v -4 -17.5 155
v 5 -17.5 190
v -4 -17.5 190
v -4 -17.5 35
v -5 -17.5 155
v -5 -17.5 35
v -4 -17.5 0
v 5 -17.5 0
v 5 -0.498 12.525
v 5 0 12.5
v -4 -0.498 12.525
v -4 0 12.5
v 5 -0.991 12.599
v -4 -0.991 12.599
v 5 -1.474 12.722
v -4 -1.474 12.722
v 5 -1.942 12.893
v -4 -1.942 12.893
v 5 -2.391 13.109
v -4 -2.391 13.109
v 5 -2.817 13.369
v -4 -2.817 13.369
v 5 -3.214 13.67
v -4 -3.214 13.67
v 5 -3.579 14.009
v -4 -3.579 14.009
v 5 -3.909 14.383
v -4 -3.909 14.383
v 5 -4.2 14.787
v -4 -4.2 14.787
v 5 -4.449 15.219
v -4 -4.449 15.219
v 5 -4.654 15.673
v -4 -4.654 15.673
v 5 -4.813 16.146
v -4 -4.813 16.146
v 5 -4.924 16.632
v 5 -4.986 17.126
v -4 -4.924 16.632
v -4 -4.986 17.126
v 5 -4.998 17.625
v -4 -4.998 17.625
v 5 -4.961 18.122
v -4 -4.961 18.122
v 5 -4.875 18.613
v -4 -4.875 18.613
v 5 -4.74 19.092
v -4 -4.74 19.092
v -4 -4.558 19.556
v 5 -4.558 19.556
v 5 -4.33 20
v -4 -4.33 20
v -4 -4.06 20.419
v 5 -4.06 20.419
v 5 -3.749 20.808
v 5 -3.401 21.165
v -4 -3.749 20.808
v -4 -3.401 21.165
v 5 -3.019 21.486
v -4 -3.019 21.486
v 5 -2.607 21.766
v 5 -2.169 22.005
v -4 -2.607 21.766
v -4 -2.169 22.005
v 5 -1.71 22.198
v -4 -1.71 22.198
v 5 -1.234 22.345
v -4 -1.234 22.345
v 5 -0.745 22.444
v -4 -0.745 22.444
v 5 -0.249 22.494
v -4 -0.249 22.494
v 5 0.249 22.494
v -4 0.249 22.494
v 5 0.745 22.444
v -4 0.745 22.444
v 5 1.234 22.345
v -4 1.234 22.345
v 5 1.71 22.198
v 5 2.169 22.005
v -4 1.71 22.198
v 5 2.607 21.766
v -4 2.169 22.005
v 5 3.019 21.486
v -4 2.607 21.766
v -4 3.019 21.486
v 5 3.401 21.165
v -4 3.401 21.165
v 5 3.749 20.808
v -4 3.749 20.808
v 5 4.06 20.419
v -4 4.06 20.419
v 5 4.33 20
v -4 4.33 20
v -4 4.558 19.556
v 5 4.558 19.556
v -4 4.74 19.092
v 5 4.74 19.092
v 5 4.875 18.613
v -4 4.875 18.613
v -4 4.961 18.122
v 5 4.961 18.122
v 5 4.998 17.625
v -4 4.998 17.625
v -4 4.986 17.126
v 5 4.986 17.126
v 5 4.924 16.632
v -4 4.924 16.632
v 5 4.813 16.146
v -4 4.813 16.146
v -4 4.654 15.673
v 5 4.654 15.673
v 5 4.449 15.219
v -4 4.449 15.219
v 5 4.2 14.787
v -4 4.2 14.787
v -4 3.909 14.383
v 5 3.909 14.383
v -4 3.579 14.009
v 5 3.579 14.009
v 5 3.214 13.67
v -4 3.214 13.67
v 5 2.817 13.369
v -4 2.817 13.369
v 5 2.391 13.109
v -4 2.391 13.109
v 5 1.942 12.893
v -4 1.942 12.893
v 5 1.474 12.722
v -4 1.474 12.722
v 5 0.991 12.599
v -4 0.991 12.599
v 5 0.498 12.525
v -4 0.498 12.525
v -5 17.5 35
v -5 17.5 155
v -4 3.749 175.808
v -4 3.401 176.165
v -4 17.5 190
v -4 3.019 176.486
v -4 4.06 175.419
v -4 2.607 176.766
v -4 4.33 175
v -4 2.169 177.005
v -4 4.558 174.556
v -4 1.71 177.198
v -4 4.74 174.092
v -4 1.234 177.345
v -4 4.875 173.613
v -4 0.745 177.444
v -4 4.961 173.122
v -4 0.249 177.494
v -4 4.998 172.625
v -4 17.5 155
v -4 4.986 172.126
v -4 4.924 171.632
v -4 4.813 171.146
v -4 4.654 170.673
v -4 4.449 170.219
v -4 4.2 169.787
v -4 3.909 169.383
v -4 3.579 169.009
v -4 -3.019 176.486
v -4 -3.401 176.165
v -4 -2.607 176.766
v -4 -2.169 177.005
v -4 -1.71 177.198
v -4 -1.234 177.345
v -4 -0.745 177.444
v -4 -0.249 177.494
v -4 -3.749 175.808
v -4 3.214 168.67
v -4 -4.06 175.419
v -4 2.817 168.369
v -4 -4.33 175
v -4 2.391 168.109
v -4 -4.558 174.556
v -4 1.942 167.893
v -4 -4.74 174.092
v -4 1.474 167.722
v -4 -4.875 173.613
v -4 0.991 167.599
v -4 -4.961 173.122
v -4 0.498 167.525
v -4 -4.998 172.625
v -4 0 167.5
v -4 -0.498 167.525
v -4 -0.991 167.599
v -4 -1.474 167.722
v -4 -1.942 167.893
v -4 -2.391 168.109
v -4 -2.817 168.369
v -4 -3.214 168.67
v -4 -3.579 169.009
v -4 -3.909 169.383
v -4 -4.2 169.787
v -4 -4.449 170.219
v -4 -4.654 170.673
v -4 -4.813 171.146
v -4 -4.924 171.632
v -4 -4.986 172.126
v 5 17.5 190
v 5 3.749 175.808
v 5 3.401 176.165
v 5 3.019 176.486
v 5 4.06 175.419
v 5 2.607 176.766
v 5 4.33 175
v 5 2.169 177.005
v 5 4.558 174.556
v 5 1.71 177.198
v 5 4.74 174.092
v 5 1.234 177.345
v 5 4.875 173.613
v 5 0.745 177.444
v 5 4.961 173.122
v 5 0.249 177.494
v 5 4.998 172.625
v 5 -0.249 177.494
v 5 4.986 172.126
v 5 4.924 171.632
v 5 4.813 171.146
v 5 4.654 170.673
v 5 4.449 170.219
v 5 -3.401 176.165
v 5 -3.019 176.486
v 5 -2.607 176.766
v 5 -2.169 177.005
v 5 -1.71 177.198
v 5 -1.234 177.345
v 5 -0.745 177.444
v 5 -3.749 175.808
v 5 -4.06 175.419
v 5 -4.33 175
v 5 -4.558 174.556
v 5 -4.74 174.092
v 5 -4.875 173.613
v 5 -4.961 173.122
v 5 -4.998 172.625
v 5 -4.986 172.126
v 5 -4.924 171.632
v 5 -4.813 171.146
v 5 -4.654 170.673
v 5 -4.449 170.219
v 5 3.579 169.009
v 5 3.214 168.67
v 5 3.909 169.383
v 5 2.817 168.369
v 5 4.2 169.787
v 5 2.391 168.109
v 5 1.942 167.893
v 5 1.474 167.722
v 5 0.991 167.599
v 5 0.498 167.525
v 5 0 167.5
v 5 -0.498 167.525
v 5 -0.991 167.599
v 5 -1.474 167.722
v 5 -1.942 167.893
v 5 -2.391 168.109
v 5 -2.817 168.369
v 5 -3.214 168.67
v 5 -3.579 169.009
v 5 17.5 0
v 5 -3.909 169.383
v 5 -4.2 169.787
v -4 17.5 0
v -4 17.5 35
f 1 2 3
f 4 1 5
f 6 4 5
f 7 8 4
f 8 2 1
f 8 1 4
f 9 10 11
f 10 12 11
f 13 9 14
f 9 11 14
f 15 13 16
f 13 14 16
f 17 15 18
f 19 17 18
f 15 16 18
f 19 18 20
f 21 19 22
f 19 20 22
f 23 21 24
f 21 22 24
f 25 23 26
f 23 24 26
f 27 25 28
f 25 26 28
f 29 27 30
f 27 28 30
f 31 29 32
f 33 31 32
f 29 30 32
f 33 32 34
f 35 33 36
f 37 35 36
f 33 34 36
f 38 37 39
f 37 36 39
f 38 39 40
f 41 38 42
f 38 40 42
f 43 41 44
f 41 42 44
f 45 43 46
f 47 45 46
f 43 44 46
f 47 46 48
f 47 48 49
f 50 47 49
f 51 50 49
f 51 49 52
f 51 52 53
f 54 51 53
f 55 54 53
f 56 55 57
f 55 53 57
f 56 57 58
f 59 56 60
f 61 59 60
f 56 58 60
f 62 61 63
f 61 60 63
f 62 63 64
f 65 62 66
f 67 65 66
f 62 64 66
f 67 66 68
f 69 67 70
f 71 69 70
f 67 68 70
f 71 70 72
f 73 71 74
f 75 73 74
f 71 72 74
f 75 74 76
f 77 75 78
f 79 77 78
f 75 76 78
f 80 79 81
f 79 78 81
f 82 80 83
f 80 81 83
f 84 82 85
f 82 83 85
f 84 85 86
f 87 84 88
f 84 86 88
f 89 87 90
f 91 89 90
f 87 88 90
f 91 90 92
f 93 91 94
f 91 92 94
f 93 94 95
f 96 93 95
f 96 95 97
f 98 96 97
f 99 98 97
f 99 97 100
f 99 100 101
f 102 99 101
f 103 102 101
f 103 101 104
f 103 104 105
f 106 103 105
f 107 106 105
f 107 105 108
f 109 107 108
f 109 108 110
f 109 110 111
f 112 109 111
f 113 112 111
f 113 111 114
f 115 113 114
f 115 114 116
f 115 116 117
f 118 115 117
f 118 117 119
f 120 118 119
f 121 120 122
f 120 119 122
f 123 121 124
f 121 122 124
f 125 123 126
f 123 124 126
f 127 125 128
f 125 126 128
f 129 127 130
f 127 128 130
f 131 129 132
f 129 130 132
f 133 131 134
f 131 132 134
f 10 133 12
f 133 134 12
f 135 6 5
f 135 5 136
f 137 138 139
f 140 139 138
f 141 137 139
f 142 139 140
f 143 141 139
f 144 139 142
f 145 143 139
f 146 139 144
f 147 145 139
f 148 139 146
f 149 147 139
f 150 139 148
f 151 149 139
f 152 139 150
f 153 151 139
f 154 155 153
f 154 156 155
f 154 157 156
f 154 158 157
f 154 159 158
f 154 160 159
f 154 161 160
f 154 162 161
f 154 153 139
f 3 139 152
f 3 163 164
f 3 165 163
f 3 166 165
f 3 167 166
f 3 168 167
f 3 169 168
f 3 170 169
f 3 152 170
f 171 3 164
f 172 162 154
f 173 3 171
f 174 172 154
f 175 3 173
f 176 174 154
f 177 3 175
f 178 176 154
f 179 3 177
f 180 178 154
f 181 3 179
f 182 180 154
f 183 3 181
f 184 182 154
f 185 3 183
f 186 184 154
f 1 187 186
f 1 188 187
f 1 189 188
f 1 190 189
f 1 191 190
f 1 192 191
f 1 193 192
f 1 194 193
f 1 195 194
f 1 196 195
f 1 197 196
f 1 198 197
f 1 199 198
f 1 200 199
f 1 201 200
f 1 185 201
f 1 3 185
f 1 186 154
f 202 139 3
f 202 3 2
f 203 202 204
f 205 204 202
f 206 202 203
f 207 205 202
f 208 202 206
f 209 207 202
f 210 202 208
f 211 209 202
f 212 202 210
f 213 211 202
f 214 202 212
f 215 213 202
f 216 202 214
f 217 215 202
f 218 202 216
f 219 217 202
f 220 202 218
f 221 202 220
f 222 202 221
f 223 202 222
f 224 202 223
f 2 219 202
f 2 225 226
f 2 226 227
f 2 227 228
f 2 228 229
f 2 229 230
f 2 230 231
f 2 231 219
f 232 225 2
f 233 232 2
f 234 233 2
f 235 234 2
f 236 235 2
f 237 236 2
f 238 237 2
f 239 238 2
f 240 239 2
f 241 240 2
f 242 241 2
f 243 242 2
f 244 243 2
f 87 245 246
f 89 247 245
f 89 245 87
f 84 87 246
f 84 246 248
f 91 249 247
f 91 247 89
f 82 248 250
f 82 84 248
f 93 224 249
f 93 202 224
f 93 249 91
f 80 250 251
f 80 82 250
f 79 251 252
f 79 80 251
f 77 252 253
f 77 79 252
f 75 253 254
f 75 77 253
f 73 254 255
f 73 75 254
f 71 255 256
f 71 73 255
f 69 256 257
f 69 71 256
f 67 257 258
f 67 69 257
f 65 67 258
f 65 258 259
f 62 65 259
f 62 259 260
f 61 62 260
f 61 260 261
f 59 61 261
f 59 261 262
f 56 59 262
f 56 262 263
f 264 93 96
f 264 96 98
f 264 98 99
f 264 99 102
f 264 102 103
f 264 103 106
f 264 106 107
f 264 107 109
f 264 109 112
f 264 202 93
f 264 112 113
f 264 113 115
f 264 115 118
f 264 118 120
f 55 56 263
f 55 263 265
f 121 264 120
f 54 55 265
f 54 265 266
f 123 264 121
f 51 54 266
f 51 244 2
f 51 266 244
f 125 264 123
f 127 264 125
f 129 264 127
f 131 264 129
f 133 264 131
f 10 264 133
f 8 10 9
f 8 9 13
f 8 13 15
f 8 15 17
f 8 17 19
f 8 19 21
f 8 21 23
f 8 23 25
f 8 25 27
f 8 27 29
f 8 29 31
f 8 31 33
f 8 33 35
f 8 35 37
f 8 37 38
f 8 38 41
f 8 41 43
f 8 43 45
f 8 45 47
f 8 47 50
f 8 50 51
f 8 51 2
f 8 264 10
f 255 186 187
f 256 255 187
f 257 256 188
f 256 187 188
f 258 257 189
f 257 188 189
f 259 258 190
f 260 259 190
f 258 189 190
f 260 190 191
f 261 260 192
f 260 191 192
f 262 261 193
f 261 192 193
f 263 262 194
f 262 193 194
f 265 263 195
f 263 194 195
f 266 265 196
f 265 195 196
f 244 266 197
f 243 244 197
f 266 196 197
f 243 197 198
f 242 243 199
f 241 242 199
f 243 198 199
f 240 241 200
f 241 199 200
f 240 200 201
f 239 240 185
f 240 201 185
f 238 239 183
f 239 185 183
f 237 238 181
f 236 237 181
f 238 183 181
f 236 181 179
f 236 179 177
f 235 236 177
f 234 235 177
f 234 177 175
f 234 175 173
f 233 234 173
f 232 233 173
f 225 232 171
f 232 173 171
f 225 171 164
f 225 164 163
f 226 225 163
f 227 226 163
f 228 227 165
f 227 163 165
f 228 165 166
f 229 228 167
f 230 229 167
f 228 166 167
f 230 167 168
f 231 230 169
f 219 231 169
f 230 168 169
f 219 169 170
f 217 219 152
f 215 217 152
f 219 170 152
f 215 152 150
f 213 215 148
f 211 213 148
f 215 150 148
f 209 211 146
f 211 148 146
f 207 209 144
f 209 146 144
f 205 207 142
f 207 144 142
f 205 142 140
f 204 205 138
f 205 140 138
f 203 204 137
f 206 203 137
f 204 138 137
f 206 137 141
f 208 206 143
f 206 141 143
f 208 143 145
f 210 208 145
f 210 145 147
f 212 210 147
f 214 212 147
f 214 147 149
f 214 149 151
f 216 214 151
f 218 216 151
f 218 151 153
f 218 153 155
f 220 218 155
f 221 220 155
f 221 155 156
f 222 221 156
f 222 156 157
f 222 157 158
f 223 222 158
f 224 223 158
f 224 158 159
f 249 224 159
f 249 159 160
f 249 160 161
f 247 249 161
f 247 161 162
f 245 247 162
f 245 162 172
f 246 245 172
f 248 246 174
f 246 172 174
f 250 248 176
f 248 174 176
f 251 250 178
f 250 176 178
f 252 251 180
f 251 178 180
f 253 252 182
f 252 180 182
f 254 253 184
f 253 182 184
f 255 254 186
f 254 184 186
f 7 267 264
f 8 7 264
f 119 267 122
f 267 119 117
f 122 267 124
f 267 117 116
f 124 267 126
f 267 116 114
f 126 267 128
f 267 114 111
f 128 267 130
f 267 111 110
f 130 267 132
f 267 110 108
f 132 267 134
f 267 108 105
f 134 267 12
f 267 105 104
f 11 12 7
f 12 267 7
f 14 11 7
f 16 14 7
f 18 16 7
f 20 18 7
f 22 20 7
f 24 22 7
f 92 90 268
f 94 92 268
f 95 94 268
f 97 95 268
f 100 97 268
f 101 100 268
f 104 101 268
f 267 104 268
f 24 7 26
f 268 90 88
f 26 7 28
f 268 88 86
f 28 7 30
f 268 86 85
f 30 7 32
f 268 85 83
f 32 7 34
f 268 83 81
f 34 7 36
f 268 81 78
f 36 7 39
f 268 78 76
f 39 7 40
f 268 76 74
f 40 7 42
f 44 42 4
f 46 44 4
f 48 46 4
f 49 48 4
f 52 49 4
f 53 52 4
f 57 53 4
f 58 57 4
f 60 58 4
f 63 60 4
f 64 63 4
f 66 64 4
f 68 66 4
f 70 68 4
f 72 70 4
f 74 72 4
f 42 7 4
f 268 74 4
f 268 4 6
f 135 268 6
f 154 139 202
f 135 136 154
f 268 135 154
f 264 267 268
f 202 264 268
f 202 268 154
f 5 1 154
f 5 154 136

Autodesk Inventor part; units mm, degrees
ref_plane "YZ Plane" through (0, 0, 0) normal (1, 0, 0) x (0, 1, 0)
ref_plane "Startebene" through (0, 0, 0) normal (0, 0, 1) x (1, 0, 0)
ref_plane "Endebene" through (0, 0, 190) normal (0, 0, 1) x (1, 0, 0)
sketch "Skizze" plane through (0, 0, 0) normal (0, 0, 1) x (1, 0, 0)
  line L0 (5, -17.5) -> (-5, -17.5)
  line L1 (-5, -17.5) -> (-5, 17.5)
  line L2 (-5, 17.5) -> (5, 17.5)
  line L3 (5, 17.5) -> (5, -17.5)
  line L4 (-6, 0) -> (8, 0) construction
  line L5 (0, -30) -> (0, 40) construction
  line L6 (0, 54) -> (0, -44) construction
  line L7 (-9.2, 0) -> (13.2, 0) construction
  dimension "d0" = 35
  dimension "d1" = 10
  dimension "d4" = 5
  dimension "d5" = 17.5
extrude "Körper" add sketch "Skizze" along normal up to surface (190 mm away) from surface at 0
sketch "Sketch3" plane through (0, 0, 0) normal (0, 0, 1) x (1, 0, 0)
  line L0 (0, 0) -> (10, 0)
ref_plane "Work Plane3" through (0, 0, 0) normal (0, -1, 0) x (1, 0, 0)
sketch "Sketch4" plane through (0, 0, 0) normal (0, -1, 0) x (1, 0, 0)
  line L0 (-2, 0) -> (12, 0)
  line L1 (-2, 190) -> (12, 190)
  dimension "d9" = 190
sketch "Skizze5" plane through (5, -17.5, 190) normal (1, 0, 0) x (0, 0, -1)
  line L0 (0, 35) -> (0, 0) projected
  line L1 (190, 35) -> (190, 0) projected
  line L2 (190, 35) -> (0, 35) projected
  point P0 (190, 17.5)
  point P1 (17.5, 17.5)
  point P2 (172.5, 17.5)
  dimension "d10" = 17.5
  dimension "d11" = 17.5
  dimension "d12" = 17.5
  dimension "d13" = 17.5
hole "Bohrung1" at (5, 0, 17.5) at (5, 0, 172.5) direction (-1, 0, 0) diameter 10 end through all
sketch "Skizze7" plane through (-5, -17.5, 0) normal (0, -1, 0) x (1, 0, 0)
  line L0 (0, 190) -> (1, 190)
  line L1 (1, 190) -> (1, 155)
  line L2 (1, 155) -> (0, 155)
  line L3 (0, 155) -> (0, 190)
  line L4 (0, 0) -> (1, 0)
  line L5 (1, 0) -> (1, 35)
  line L6 (1, 35) -> (0, 35)
  line L7 (0, 35) -> (0, 0)
  dimension "d26" = 35
  dimension "d27" = 35
  dimension "d28" = 1
  dimension "d29" = 1
extrude "Extrusion2" cut sketch "Skizze7" against normal through all
equation "\"d0\" = G_W"
equation "\"d1\" = G_H"
equation "\"d4\" = 0.5 * d1"
equation "\"d5\" = 0.5 * d0"
equation "\"d2\" = G_L"
equation "\"G_W\" = 35"
equation "\"G_H\" = 10"
equation "\"G_L\" = d9"
equation "\"G_OFFSET_START\" = 0"
equation "\"G_OFFSET_END\" = 0"
properties part number "EN 10058 - 35 x 10 - 190" material "Stahl, weich"
